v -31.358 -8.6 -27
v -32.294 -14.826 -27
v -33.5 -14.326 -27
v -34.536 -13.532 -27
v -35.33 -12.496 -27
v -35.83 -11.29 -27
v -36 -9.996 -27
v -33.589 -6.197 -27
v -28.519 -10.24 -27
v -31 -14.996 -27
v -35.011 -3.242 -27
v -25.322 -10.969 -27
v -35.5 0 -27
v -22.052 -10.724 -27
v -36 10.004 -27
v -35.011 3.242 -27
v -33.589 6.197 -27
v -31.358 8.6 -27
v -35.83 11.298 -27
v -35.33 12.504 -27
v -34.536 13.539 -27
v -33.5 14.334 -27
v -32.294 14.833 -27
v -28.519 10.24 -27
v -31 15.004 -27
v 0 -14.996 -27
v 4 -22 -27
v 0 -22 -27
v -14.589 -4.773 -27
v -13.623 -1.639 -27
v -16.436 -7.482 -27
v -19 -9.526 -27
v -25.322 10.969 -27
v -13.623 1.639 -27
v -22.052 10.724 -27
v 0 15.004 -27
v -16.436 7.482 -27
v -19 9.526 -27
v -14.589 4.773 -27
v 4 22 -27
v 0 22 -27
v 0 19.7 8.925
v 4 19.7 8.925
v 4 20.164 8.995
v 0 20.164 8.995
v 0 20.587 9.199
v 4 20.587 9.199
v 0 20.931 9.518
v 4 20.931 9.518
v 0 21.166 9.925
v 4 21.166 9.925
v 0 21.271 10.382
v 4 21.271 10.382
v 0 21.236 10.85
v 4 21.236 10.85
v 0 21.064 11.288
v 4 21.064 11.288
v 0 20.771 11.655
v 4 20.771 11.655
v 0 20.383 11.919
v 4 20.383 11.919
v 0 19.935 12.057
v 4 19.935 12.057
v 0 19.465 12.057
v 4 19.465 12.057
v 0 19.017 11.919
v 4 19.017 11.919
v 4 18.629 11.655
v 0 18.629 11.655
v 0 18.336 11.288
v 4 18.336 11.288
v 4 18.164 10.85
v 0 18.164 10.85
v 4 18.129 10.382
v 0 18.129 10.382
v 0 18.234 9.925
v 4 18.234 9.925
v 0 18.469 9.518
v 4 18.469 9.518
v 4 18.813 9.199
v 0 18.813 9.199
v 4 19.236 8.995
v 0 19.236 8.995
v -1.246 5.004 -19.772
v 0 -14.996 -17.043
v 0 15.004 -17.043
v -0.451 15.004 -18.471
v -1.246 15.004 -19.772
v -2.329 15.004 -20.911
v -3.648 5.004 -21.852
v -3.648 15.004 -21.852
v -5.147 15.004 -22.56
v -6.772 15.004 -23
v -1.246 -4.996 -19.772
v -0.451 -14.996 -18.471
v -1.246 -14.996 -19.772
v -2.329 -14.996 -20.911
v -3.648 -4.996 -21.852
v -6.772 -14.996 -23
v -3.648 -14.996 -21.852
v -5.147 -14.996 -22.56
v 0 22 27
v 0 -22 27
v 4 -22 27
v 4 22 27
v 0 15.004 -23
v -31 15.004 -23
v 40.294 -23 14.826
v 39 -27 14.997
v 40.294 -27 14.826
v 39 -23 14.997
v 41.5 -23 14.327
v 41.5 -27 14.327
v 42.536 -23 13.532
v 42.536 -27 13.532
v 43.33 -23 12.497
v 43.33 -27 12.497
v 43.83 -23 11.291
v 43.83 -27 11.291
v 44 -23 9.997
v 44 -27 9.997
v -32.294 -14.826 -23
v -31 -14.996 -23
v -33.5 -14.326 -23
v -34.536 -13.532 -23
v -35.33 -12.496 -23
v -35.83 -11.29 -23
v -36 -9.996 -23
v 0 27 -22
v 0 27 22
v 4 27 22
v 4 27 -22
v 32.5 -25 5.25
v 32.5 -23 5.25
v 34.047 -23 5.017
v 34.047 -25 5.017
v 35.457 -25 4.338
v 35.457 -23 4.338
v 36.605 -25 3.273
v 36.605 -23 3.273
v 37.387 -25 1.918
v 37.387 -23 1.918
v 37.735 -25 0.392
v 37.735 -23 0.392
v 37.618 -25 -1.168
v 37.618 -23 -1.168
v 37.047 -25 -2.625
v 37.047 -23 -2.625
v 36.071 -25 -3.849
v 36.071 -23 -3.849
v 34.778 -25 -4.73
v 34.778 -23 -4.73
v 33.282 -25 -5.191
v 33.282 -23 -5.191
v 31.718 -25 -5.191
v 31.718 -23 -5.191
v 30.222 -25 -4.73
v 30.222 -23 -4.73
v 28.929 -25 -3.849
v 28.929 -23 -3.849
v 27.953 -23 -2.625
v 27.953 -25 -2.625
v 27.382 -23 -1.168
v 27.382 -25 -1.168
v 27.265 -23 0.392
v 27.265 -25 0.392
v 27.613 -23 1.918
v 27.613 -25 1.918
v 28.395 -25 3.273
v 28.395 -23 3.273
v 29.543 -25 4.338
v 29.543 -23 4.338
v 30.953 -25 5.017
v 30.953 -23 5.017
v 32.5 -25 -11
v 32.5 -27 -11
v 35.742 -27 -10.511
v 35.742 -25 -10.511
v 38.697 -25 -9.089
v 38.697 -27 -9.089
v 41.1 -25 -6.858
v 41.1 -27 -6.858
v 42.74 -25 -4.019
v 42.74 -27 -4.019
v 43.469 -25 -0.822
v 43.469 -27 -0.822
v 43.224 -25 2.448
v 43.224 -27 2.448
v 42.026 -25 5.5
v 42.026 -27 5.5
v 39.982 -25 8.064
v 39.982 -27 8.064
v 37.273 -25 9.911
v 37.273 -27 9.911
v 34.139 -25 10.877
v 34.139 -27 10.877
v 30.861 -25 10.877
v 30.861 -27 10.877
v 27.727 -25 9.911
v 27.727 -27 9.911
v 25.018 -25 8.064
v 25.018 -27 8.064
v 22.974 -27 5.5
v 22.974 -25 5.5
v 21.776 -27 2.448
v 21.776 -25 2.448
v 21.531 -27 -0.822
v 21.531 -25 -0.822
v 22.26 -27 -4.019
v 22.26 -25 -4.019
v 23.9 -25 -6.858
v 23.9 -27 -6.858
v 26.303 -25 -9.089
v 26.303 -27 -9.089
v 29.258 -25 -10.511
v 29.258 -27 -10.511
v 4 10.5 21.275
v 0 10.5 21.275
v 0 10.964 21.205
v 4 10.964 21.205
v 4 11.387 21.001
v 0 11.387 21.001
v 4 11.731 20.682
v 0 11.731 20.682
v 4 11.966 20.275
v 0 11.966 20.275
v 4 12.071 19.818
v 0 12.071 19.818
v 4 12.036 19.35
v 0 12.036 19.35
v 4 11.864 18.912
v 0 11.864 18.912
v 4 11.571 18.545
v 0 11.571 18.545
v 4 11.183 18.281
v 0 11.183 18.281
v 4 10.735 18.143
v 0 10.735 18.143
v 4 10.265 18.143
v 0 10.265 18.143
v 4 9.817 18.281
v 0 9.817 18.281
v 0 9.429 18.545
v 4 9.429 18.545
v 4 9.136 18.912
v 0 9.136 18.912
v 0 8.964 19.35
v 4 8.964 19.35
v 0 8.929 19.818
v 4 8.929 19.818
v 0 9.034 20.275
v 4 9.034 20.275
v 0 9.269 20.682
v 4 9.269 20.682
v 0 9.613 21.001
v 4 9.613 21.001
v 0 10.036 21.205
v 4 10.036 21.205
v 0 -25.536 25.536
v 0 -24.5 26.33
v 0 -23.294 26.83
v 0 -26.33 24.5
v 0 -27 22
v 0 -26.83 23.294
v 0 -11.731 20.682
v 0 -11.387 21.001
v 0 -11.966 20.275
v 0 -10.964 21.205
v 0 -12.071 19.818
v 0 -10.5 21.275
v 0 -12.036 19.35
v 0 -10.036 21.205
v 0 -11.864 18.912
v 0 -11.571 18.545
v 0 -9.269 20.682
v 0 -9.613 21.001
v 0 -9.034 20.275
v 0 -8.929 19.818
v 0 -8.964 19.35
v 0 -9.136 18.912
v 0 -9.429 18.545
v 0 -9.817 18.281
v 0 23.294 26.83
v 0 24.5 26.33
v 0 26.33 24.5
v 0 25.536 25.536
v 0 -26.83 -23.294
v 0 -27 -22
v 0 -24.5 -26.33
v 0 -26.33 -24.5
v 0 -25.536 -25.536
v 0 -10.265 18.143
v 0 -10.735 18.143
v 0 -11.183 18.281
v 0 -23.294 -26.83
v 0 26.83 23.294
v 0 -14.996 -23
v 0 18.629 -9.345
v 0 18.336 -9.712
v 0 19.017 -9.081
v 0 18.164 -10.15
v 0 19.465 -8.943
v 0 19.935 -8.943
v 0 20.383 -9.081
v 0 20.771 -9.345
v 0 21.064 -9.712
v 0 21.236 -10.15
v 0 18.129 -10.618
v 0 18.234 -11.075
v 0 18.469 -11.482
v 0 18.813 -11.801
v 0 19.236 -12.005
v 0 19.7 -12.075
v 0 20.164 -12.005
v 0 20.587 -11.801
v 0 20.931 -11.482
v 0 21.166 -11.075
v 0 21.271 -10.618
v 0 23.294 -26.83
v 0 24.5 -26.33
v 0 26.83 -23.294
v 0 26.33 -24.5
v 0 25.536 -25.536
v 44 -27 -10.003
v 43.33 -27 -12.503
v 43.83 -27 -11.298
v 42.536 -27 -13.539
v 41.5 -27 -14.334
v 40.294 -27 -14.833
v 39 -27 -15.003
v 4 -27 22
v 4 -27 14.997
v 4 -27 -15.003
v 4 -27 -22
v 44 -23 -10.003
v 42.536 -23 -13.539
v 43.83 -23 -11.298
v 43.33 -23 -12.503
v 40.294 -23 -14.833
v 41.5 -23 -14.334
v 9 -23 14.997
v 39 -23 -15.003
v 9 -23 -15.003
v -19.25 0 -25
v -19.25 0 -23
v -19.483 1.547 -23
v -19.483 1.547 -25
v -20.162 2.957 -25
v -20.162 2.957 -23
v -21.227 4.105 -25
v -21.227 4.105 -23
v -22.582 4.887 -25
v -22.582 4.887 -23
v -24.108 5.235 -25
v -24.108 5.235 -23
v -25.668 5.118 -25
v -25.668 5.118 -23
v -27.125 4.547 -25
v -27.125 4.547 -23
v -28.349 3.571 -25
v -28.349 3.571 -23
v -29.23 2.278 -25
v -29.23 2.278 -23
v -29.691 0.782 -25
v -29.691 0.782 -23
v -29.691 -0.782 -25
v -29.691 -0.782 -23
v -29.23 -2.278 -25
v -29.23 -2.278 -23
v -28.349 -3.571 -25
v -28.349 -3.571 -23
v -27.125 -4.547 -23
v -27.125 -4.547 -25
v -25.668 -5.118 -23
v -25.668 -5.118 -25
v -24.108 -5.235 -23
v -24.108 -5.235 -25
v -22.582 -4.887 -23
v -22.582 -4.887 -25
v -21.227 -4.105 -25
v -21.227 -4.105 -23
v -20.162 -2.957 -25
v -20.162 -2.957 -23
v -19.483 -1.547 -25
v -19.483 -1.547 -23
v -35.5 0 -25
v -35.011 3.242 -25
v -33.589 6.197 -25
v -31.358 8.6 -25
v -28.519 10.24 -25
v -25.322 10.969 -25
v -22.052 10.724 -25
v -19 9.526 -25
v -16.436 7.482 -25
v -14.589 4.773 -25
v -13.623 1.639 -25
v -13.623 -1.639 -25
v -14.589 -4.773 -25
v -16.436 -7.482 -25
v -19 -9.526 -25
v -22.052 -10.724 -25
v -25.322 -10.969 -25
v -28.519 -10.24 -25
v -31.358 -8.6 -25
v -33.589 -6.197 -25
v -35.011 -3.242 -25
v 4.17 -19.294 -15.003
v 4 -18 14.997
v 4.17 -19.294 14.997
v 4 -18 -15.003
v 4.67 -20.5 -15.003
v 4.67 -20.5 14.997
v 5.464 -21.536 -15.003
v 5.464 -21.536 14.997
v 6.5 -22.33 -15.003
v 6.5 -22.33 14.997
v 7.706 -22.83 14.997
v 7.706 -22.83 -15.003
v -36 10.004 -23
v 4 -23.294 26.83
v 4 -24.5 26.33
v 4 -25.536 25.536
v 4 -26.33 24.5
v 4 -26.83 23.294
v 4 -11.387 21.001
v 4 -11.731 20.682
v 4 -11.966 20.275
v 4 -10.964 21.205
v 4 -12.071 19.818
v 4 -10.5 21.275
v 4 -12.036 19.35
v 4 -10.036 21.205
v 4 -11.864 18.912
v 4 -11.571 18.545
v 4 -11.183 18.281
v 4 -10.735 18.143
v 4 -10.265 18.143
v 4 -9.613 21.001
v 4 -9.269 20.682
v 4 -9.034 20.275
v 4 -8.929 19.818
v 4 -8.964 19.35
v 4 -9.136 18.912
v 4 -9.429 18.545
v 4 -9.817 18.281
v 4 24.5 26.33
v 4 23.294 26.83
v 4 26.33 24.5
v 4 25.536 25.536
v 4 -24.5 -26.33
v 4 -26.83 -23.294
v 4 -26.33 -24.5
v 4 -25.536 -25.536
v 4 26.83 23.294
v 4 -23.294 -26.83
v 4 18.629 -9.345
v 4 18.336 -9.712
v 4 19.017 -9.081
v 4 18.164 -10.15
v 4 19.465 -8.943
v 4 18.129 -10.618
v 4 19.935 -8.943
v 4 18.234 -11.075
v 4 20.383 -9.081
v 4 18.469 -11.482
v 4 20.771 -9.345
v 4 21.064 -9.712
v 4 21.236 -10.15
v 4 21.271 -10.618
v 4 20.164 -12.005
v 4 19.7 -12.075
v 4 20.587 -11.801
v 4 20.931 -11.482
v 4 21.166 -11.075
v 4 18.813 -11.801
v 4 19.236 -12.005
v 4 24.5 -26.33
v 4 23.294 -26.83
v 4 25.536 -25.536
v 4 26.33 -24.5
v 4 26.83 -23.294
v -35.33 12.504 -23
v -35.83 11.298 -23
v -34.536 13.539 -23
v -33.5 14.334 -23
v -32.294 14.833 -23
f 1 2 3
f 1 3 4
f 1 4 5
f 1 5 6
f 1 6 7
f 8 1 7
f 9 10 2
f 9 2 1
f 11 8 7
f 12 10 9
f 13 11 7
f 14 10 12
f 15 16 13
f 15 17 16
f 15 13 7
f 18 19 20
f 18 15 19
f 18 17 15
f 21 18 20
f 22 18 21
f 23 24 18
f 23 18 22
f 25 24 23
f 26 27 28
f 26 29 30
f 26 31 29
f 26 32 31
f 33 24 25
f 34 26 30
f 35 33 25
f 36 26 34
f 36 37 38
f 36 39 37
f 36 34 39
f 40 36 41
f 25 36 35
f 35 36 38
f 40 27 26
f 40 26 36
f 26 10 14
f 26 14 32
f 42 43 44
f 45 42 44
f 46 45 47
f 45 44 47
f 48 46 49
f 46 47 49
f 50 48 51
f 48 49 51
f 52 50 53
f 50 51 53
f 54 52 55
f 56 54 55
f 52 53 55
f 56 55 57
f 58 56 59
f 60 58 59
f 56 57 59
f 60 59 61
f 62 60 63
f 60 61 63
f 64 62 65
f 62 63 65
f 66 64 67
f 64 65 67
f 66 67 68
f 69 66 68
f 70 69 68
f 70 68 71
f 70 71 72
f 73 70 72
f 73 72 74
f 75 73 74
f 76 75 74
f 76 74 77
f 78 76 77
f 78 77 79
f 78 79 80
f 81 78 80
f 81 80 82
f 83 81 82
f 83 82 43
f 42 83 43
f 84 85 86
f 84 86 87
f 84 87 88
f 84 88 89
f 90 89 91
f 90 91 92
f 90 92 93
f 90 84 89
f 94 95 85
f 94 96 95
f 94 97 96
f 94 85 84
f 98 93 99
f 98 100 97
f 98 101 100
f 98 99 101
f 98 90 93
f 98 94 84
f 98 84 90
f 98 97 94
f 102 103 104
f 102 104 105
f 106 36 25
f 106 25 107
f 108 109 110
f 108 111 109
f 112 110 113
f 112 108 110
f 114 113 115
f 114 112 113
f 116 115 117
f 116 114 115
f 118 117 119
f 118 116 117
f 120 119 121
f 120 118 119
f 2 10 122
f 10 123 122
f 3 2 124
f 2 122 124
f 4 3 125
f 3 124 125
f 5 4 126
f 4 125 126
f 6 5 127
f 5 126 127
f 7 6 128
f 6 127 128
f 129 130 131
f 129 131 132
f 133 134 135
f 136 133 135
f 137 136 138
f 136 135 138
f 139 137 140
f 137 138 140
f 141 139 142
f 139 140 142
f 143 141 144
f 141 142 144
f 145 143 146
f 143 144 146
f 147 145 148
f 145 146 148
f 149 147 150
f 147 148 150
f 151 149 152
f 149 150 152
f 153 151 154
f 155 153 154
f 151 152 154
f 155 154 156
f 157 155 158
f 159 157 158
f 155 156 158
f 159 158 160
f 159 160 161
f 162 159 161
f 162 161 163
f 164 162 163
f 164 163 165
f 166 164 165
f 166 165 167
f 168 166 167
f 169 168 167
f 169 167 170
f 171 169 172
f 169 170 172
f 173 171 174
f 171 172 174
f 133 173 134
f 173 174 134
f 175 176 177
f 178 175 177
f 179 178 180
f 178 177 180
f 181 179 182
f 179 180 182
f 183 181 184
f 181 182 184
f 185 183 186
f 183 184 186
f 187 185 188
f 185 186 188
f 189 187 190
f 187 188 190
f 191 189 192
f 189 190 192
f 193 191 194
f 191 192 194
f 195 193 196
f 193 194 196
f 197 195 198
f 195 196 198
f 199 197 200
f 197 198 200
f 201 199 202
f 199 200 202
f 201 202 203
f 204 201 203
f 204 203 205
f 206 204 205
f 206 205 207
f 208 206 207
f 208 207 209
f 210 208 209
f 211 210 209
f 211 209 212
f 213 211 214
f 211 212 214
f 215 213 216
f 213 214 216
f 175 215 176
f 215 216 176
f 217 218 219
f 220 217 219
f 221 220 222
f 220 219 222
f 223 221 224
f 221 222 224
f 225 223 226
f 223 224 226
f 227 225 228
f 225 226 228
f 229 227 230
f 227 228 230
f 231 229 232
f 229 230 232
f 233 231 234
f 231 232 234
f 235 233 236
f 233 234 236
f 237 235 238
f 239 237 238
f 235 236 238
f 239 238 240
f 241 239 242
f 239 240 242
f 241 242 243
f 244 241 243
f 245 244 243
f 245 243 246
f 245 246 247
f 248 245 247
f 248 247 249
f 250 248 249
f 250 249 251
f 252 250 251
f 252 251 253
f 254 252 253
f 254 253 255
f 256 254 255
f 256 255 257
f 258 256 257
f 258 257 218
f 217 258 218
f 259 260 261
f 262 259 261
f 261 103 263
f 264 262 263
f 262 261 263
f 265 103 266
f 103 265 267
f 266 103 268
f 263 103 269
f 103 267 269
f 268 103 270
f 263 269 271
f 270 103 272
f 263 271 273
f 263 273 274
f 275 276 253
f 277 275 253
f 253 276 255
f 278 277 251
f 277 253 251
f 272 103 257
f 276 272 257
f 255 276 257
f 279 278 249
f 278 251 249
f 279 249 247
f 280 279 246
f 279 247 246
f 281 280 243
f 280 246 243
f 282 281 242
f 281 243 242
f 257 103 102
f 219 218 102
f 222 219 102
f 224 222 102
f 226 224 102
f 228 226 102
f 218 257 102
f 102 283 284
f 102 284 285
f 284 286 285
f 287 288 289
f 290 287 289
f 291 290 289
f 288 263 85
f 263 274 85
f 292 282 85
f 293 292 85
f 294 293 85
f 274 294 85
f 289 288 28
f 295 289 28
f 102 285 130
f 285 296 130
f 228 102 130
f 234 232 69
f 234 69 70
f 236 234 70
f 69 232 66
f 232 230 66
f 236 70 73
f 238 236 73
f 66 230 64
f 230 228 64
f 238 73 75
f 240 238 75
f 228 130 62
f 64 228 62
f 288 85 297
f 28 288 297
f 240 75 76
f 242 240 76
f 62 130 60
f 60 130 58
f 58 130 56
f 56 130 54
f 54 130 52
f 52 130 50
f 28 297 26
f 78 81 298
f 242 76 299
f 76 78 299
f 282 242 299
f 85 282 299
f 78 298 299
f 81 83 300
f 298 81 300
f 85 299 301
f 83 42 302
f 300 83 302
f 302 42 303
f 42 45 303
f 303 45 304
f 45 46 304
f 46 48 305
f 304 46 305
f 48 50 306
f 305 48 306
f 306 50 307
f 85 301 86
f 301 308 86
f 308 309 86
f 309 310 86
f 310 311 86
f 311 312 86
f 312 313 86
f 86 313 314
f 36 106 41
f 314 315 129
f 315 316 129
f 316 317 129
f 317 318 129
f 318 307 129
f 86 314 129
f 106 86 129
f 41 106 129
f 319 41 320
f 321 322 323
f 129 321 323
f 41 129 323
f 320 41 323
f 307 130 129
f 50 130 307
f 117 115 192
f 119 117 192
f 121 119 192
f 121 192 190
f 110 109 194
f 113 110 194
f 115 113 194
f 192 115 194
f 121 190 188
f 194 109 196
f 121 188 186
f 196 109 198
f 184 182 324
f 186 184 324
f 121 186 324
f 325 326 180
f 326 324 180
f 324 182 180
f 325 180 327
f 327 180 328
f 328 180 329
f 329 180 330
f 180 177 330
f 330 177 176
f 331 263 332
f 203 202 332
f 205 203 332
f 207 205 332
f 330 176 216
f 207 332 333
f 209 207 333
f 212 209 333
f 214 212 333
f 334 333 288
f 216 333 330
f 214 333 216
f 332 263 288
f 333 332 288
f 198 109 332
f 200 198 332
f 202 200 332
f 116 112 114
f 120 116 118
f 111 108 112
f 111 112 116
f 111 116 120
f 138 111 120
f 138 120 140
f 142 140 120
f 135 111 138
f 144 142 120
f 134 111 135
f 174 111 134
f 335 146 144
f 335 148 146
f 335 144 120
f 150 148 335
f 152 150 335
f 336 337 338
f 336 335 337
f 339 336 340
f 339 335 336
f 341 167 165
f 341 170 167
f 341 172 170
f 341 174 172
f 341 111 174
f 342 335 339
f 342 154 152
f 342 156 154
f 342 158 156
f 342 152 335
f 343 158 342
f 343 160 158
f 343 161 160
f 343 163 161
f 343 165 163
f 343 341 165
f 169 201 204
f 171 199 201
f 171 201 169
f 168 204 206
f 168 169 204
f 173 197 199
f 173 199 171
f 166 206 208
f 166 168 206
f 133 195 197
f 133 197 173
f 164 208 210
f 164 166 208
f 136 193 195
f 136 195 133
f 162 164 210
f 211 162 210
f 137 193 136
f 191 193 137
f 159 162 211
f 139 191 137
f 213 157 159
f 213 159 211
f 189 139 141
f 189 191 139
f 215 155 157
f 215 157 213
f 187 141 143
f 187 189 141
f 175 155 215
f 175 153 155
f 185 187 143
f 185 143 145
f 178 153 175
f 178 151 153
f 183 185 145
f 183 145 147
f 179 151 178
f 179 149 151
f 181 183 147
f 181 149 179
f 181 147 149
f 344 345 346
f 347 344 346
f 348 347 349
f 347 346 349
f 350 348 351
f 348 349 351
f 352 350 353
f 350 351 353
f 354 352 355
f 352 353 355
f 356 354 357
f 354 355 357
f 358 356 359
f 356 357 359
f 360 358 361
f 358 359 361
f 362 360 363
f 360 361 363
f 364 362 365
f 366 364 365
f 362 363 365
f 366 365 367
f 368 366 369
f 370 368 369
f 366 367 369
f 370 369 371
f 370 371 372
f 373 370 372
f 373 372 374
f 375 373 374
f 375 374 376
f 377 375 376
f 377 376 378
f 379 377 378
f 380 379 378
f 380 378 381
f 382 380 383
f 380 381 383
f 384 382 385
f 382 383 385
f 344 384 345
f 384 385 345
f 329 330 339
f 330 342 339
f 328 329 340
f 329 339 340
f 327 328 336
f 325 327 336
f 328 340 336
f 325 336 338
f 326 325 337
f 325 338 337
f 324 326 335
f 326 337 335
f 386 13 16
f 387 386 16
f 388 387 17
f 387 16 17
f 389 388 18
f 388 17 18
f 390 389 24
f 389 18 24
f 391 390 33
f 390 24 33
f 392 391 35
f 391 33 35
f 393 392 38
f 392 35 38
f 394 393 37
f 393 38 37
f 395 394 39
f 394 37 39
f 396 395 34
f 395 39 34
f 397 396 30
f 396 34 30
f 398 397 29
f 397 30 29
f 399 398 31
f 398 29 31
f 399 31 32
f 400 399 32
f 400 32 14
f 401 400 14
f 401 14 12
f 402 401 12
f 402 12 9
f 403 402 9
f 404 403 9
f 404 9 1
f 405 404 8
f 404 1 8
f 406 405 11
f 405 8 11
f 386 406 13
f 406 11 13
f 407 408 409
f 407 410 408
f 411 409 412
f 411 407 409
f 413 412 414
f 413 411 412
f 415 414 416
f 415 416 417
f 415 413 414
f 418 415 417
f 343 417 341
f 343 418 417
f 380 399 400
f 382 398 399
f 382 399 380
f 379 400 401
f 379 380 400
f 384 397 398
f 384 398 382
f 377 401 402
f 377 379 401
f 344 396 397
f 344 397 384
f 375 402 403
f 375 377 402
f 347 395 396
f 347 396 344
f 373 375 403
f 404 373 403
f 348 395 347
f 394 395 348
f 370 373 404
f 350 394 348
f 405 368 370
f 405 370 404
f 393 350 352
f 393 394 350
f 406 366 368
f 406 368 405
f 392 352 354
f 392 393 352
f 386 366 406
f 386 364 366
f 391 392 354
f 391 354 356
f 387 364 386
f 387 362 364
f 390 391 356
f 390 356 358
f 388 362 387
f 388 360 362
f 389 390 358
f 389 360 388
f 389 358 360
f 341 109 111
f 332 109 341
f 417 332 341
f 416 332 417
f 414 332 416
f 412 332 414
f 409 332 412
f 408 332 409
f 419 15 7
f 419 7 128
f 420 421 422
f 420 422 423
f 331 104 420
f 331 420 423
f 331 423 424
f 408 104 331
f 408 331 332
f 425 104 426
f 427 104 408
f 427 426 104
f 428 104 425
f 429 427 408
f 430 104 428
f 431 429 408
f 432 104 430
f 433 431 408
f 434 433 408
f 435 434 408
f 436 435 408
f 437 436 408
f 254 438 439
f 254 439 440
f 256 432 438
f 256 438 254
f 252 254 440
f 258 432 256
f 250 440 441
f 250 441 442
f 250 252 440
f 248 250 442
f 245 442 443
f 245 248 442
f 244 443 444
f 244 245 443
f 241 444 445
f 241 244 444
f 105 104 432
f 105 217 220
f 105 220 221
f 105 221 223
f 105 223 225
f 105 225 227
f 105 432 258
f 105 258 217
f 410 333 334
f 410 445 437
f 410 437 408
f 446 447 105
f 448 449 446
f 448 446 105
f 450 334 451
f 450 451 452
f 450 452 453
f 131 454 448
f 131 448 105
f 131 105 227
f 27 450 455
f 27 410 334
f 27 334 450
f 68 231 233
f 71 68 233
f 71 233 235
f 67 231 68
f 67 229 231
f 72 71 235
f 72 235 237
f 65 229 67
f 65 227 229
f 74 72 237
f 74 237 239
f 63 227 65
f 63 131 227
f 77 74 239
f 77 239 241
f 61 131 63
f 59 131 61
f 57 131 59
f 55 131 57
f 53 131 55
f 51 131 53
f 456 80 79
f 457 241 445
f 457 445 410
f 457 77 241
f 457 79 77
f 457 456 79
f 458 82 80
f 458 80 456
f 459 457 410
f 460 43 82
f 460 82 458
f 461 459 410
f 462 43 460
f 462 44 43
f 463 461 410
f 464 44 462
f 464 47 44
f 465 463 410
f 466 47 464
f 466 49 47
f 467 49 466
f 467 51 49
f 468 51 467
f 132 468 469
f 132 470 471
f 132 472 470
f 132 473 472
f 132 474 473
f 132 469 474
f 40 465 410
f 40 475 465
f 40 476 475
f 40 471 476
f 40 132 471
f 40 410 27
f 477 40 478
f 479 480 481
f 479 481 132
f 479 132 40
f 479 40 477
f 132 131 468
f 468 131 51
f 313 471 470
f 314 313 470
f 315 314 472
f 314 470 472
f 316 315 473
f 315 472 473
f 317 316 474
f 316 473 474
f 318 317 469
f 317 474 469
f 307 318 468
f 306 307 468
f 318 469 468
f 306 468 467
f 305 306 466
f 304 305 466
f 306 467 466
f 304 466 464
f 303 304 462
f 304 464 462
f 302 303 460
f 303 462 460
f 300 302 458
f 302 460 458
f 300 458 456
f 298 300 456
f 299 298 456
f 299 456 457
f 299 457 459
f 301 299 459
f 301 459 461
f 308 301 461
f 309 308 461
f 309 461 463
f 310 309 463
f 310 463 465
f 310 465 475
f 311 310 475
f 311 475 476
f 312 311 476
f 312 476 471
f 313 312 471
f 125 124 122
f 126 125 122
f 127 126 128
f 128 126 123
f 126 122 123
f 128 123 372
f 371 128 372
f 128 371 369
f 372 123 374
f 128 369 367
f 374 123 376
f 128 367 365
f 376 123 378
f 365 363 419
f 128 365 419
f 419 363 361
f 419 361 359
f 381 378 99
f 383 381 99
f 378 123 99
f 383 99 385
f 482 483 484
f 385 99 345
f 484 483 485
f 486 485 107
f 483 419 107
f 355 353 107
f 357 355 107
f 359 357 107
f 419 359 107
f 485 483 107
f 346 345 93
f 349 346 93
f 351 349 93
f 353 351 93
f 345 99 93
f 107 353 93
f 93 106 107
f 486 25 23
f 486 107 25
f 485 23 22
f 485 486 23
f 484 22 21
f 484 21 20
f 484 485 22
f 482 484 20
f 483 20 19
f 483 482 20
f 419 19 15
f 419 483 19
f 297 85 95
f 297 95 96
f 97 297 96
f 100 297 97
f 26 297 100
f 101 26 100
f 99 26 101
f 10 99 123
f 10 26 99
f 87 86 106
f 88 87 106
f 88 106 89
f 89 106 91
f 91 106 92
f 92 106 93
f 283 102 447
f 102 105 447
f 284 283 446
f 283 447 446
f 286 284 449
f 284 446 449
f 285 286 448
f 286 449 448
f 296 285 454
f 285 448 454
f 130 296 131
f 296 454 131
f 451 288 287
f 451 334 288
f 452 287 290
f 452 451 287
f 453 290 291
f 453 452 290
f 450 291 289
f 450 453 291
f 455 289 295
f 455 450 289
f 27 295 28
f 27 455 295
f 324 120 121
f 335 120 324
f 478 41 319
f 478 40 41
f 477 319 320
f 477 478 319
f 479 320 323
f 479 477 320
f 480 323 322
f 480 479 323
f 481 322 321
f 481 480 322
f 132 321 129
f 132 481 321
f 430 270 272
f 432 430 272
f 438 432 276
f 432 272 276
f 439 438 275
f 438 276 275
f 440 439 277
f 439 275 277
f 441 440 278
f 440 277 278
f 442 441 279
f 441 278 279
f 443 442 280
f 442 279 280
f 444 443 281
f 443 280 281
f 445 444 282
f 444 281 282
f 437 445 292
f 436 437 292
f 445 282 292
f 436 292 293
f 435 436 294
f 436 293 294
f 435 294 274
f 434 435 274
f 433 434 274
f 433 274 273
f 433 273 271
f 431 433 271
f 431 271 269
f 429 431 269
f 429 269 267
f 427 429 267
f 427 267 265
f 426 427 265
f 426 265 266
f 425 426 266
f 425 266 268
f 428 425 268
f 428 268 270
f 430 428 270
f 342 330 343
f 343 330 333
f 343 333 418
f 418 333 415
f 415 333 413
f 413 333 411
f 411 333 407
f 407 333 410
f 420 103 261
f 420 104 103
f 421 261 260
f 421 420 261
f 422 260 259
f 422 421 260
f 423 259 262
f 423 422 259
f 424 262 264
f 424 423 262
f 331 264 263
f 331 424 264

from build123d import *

# Parameters (mm, degrees)
SKETCH1_W            = 54
SKETCH1_H            = 54
BOSS_EXTRUDE1_DEPTH  = 4
FILLET1_R            = 5
SKETCH2_W            = 30
SKETCH2_H            = 4
BOSS_EXTRUDE2_DEPTH  = 3
SKETCH3_W            = 30
SKETCH3_H            = 4
BOSS_EXTRUDE3_DEPTH  = 37
SKETCH4_W            = 4
SKETCH4_H            = 30.000186299
BOSS_EXTRUDE6_DEPTH  = 3
SKETCH6_W            = 4
SKETCH6_H            = 30.000186299
BOSS_EXTRUDE7_DEPTH  = 33
FILLET2_R            = 5
SKETCH7_R            = 1.25
CUT_EXTRUDE1_DEPTH   = 75.706090782
SKETCH8_R            = 1.25
CUT_EXTRUDE2_DEPTH   = 75.706090782
SKETCH9_R            = 1.575
CUT_EXTRUDE3_DEPTH   = 56.299186251
SKETCH10_R           = 1.575
CUT_EXTRUDE4_DEPTH   = 56.299186251
FILLET6_R            = 5
SKETCH11_R           = 1.575
CUT_EXTRUDE5_DEPTH   = 59.258046655
SKETCH12_R           = 1.575
CUT_EXTRUDE6_DEPTH   = 33
BOSS_EXTRUDE10_DEPTH = 30
SKETCH15_R           = 11
CUT_EXTRUDE7_DEPTH   = 2
SKETCH16_R           = 5.25
CUT_EXTRUDE8_DEPTH   = 2
SKETCH17_R           = 11
CUT_EXTRUDE9_DEPTH   = 2
SKETCH18_R           = 5.25
CUT_EXTRUDE10_DEPTH  = 2


with BuildPart() as part:
    # Sketch1 → Boss-Extrude1 (new body)
    with BuildSketch(Plane(origin=(0, 0, 0), x_dir=(0, 0, -1), z_dir=(1, 0, 0))):
        Rectangle(SKETCH1_W, SKETCH1_H)
    extrude(amount=BOSS_EXTRUDE1_DEPTH)

    # Fillet1
    fillet1_edges = [part.edges().sort_by_distance(p)[0] for p in [
        (2, -27, -27),
        (2, -27, 27),
        (2, 27, 27),
        (2, 27, -27),
    ]]
    fillet(fillet1_edges, radius=FILLET1_R)

    # Sketch2 → Boss-Extrude2 (add)
    with BuildSketch(Plane(origin=(4, 0, 0), x_dir=(0, 0, -1), z_dir=(1, 0, 0))):
        with Locations((0.003473607, -25)):
            Rectangle(SKETCH2_W, SKETCH2_H)
    extrude(amount=BOSS_EXTRUDE2_DEPTH)

    # Sketch3 → Boss-Extrude3 (add)
    with BuildSketch(Plane(origin=(7, 0, 0), x_dir=(0, 0, -1), z_dir=(1, 0, 0))):
        with Locations((0.003473607, -25)):
            Rectangle(SKETCH3_W, SKETCH3_H)
    extrude(amount=BOSS_EXTRUDE3_DEPTH)

    # Sketch4 → Boss-Extrude6 (add)
    with BuildSketch(Plane.ZY):
        with Locations((-25, 0.003724222)):
            Rectangle(SKETCH4_W, SKETCH4_H)
    extrude(amount=BOSS_EXTRUDE6_DEPTH)

    # Sketch6 → Boss-Extrude7 (add)
    with BuildSketch(Plane.ZY.offset(3)):
        with Locations((-25, 0.003724222)):
            Rectangle(SKETCH6_W, SKETCH6_H)
    extrude(amount=BOSS_EXTRUDE7_DEPTH)

    # Fillet2
    fillet2_edges = [part.edges().sort_by_distance(p)[0] for p in [
        (44, -25, 14.996526393),
        (44, -25, -15.003473607),
        (-36, -14.996368927, -25),
        (-36, 15.003817372, -25),
    ]]
    fillet(fillet2_edges, radius=FILLET2_R)

    # Sketch7 → Cut-Extrude1 (cut, through all)
    with BuildSketch(Plane(origin=(0, 0, -27), x_dir=(-1, 0, 0), z_dir=(0, 0, -1))):
        with Locations((24.5, 0)):
            Circle(SKETCH7_R)
    extrude(amount=-CUT_EXTRUDE1_DEPTH, mode=Mode.SUBTRACT)

    # Sketch8 → Cut-Extrude2 (cut, through all)
    with BuildSketch(Plane(origin=(0, -27, 0), x_dir=(-1, 0, 0), z_dir=(0, -1, 0))):
        with Locations(Location((-32.5, 0, 0), (0, 0, 90))):
            Circle(SKETCH8_R)
    extrude(amount=-CUT_EXTRUDE2_DEPTH, mode=Mode.SUBTRACT)

    # Sketch9 → Cut-Extrude3 (cut, through all)
    with BuildSketch(Plane(origin=(4, 0, 0), x_dir=(0, 0, -1), z_dir=(1, 0, 0))):
        with Locations((-10.5, 19.7)):
            Circle(SKETCH9_R)
    extrude(amount=-CUT_EXTRUDE3_DEPTH, mode=Mode.SUBTRACT)

    # Sketch10 → Cut-Extrude4 (cut, through all)
    with BuildSketch(Plane(origin=(4, 0, 0), x_dir=(0, 0, -1), z_dir=(1, 0, 0))):
        with Locations((10.5, 19.7)):
            Circle(SKETCH10_R)
    extrude(amount=-CUT_EXTRUDE4_DEPTH, mode=Mode.SUBTRACT)

    # Fillet6
    fillet6_edges = [part.edges().sort_by_distance(p)[0] for p in [
        (4, -23, -0.003473607),
    ]]
    fillet(fillet6_edges, radius=FILLET6_R)

    # Sketch11 → Cut-Extrude5 (cut, through all)
    with BuildSketch(Plane.ZY):
        with Locations((19.7, 10.5)):
            Circle(SKETCH11_R)
    extrude(amount=-CUT_EXTRUDE5_DEPTH, mode=Mode.SUBTRACT)

    # Sketch12 → Cut-Extrude6 (cut)
    with BuildSketch(Plane.ZY):
        with Locations((19.7, -10.5)):
            Circle(SKETCH12_R)
    extrude(amount=-CUT_EXTRUDE6_DEPTH, mode=Mode.SUBTRACT)

    # Sketch14 → Boss-Extrude10 (add)
    with BuildSketch(Plane(origin=(0, -14.996368927, 0), x_dir=(-1, 0, 0), z_dir=(0, -1, 0))):
        with BuildLine():
            Line((6.771773058, 23), (0, 23))
            Line((0, 23), (0, 17.043091053))
            add(Edge.make_bspline(
                [(0, 17.043091053), (0.522042102, 20.003738935), (3.432344379, 22.411168624), (6.771773058, 23)],
                knots=[0, 0, 0, 0, 1, 1, 1, 1], degree=3))
        make_face()
    extrude(amount=-BOSS_EXTRUDE10_DEPTH)

    # Sketch15 → Cut-Extrude7 (cut)
    with BuildSketch(Plane(origin=(0, -27, 0), x_dir=(-1, 0, 0), z_dir=(0, -1, 0))):
        with Locations(Location((-32.5, 0, 0), (0, 0, 90))):
            Circle(SKETCH15_R)
    extrude(amount=-CUT_EXTRUDE7_DEPTH, mode=Mode.SUBTRACT)

    # Sketch16 → Cut-Extrude8 (cut)
    with BuildSketch(Plane(origin=(0, -23, 0), x_dir=(1, 0, 0), z_dir=(0, 1, 0))):
        with Locations(Location((32.5, 0, 0), (0, 0, 270))):
            Circle(SKETCH16_R)
    extrude(amount=-CUT_EXTRUDE8_DEPTH, mode=Mode.SUBTRACT)

    # Sketch17 → Cut-Extrude9 (cut)
    with BuildSketch(Plane(origin=(0, 0, -27), x_dir=(-1, 0, 0), z_dir=(0, 0, -1))):
        with Locations((24.5, 0)):
            Circle(SKETCH17_R)
    extrude(amount=-CUT_EXTRUDE9_DEPTH, mode=Mode.SUBTRACT)

    # Sketch18 → Cut-Extrude10 (cut)
    with BuildSketch(Plane.XY.offset(-23)):
        with Locations((-24.5, 0)):
            Circle(SKETCH18_R)
    extrude(amount=-CUT_EXTRUDE10_DEPTH, mode=Mode.SUBTRACT)


solid = part.part
